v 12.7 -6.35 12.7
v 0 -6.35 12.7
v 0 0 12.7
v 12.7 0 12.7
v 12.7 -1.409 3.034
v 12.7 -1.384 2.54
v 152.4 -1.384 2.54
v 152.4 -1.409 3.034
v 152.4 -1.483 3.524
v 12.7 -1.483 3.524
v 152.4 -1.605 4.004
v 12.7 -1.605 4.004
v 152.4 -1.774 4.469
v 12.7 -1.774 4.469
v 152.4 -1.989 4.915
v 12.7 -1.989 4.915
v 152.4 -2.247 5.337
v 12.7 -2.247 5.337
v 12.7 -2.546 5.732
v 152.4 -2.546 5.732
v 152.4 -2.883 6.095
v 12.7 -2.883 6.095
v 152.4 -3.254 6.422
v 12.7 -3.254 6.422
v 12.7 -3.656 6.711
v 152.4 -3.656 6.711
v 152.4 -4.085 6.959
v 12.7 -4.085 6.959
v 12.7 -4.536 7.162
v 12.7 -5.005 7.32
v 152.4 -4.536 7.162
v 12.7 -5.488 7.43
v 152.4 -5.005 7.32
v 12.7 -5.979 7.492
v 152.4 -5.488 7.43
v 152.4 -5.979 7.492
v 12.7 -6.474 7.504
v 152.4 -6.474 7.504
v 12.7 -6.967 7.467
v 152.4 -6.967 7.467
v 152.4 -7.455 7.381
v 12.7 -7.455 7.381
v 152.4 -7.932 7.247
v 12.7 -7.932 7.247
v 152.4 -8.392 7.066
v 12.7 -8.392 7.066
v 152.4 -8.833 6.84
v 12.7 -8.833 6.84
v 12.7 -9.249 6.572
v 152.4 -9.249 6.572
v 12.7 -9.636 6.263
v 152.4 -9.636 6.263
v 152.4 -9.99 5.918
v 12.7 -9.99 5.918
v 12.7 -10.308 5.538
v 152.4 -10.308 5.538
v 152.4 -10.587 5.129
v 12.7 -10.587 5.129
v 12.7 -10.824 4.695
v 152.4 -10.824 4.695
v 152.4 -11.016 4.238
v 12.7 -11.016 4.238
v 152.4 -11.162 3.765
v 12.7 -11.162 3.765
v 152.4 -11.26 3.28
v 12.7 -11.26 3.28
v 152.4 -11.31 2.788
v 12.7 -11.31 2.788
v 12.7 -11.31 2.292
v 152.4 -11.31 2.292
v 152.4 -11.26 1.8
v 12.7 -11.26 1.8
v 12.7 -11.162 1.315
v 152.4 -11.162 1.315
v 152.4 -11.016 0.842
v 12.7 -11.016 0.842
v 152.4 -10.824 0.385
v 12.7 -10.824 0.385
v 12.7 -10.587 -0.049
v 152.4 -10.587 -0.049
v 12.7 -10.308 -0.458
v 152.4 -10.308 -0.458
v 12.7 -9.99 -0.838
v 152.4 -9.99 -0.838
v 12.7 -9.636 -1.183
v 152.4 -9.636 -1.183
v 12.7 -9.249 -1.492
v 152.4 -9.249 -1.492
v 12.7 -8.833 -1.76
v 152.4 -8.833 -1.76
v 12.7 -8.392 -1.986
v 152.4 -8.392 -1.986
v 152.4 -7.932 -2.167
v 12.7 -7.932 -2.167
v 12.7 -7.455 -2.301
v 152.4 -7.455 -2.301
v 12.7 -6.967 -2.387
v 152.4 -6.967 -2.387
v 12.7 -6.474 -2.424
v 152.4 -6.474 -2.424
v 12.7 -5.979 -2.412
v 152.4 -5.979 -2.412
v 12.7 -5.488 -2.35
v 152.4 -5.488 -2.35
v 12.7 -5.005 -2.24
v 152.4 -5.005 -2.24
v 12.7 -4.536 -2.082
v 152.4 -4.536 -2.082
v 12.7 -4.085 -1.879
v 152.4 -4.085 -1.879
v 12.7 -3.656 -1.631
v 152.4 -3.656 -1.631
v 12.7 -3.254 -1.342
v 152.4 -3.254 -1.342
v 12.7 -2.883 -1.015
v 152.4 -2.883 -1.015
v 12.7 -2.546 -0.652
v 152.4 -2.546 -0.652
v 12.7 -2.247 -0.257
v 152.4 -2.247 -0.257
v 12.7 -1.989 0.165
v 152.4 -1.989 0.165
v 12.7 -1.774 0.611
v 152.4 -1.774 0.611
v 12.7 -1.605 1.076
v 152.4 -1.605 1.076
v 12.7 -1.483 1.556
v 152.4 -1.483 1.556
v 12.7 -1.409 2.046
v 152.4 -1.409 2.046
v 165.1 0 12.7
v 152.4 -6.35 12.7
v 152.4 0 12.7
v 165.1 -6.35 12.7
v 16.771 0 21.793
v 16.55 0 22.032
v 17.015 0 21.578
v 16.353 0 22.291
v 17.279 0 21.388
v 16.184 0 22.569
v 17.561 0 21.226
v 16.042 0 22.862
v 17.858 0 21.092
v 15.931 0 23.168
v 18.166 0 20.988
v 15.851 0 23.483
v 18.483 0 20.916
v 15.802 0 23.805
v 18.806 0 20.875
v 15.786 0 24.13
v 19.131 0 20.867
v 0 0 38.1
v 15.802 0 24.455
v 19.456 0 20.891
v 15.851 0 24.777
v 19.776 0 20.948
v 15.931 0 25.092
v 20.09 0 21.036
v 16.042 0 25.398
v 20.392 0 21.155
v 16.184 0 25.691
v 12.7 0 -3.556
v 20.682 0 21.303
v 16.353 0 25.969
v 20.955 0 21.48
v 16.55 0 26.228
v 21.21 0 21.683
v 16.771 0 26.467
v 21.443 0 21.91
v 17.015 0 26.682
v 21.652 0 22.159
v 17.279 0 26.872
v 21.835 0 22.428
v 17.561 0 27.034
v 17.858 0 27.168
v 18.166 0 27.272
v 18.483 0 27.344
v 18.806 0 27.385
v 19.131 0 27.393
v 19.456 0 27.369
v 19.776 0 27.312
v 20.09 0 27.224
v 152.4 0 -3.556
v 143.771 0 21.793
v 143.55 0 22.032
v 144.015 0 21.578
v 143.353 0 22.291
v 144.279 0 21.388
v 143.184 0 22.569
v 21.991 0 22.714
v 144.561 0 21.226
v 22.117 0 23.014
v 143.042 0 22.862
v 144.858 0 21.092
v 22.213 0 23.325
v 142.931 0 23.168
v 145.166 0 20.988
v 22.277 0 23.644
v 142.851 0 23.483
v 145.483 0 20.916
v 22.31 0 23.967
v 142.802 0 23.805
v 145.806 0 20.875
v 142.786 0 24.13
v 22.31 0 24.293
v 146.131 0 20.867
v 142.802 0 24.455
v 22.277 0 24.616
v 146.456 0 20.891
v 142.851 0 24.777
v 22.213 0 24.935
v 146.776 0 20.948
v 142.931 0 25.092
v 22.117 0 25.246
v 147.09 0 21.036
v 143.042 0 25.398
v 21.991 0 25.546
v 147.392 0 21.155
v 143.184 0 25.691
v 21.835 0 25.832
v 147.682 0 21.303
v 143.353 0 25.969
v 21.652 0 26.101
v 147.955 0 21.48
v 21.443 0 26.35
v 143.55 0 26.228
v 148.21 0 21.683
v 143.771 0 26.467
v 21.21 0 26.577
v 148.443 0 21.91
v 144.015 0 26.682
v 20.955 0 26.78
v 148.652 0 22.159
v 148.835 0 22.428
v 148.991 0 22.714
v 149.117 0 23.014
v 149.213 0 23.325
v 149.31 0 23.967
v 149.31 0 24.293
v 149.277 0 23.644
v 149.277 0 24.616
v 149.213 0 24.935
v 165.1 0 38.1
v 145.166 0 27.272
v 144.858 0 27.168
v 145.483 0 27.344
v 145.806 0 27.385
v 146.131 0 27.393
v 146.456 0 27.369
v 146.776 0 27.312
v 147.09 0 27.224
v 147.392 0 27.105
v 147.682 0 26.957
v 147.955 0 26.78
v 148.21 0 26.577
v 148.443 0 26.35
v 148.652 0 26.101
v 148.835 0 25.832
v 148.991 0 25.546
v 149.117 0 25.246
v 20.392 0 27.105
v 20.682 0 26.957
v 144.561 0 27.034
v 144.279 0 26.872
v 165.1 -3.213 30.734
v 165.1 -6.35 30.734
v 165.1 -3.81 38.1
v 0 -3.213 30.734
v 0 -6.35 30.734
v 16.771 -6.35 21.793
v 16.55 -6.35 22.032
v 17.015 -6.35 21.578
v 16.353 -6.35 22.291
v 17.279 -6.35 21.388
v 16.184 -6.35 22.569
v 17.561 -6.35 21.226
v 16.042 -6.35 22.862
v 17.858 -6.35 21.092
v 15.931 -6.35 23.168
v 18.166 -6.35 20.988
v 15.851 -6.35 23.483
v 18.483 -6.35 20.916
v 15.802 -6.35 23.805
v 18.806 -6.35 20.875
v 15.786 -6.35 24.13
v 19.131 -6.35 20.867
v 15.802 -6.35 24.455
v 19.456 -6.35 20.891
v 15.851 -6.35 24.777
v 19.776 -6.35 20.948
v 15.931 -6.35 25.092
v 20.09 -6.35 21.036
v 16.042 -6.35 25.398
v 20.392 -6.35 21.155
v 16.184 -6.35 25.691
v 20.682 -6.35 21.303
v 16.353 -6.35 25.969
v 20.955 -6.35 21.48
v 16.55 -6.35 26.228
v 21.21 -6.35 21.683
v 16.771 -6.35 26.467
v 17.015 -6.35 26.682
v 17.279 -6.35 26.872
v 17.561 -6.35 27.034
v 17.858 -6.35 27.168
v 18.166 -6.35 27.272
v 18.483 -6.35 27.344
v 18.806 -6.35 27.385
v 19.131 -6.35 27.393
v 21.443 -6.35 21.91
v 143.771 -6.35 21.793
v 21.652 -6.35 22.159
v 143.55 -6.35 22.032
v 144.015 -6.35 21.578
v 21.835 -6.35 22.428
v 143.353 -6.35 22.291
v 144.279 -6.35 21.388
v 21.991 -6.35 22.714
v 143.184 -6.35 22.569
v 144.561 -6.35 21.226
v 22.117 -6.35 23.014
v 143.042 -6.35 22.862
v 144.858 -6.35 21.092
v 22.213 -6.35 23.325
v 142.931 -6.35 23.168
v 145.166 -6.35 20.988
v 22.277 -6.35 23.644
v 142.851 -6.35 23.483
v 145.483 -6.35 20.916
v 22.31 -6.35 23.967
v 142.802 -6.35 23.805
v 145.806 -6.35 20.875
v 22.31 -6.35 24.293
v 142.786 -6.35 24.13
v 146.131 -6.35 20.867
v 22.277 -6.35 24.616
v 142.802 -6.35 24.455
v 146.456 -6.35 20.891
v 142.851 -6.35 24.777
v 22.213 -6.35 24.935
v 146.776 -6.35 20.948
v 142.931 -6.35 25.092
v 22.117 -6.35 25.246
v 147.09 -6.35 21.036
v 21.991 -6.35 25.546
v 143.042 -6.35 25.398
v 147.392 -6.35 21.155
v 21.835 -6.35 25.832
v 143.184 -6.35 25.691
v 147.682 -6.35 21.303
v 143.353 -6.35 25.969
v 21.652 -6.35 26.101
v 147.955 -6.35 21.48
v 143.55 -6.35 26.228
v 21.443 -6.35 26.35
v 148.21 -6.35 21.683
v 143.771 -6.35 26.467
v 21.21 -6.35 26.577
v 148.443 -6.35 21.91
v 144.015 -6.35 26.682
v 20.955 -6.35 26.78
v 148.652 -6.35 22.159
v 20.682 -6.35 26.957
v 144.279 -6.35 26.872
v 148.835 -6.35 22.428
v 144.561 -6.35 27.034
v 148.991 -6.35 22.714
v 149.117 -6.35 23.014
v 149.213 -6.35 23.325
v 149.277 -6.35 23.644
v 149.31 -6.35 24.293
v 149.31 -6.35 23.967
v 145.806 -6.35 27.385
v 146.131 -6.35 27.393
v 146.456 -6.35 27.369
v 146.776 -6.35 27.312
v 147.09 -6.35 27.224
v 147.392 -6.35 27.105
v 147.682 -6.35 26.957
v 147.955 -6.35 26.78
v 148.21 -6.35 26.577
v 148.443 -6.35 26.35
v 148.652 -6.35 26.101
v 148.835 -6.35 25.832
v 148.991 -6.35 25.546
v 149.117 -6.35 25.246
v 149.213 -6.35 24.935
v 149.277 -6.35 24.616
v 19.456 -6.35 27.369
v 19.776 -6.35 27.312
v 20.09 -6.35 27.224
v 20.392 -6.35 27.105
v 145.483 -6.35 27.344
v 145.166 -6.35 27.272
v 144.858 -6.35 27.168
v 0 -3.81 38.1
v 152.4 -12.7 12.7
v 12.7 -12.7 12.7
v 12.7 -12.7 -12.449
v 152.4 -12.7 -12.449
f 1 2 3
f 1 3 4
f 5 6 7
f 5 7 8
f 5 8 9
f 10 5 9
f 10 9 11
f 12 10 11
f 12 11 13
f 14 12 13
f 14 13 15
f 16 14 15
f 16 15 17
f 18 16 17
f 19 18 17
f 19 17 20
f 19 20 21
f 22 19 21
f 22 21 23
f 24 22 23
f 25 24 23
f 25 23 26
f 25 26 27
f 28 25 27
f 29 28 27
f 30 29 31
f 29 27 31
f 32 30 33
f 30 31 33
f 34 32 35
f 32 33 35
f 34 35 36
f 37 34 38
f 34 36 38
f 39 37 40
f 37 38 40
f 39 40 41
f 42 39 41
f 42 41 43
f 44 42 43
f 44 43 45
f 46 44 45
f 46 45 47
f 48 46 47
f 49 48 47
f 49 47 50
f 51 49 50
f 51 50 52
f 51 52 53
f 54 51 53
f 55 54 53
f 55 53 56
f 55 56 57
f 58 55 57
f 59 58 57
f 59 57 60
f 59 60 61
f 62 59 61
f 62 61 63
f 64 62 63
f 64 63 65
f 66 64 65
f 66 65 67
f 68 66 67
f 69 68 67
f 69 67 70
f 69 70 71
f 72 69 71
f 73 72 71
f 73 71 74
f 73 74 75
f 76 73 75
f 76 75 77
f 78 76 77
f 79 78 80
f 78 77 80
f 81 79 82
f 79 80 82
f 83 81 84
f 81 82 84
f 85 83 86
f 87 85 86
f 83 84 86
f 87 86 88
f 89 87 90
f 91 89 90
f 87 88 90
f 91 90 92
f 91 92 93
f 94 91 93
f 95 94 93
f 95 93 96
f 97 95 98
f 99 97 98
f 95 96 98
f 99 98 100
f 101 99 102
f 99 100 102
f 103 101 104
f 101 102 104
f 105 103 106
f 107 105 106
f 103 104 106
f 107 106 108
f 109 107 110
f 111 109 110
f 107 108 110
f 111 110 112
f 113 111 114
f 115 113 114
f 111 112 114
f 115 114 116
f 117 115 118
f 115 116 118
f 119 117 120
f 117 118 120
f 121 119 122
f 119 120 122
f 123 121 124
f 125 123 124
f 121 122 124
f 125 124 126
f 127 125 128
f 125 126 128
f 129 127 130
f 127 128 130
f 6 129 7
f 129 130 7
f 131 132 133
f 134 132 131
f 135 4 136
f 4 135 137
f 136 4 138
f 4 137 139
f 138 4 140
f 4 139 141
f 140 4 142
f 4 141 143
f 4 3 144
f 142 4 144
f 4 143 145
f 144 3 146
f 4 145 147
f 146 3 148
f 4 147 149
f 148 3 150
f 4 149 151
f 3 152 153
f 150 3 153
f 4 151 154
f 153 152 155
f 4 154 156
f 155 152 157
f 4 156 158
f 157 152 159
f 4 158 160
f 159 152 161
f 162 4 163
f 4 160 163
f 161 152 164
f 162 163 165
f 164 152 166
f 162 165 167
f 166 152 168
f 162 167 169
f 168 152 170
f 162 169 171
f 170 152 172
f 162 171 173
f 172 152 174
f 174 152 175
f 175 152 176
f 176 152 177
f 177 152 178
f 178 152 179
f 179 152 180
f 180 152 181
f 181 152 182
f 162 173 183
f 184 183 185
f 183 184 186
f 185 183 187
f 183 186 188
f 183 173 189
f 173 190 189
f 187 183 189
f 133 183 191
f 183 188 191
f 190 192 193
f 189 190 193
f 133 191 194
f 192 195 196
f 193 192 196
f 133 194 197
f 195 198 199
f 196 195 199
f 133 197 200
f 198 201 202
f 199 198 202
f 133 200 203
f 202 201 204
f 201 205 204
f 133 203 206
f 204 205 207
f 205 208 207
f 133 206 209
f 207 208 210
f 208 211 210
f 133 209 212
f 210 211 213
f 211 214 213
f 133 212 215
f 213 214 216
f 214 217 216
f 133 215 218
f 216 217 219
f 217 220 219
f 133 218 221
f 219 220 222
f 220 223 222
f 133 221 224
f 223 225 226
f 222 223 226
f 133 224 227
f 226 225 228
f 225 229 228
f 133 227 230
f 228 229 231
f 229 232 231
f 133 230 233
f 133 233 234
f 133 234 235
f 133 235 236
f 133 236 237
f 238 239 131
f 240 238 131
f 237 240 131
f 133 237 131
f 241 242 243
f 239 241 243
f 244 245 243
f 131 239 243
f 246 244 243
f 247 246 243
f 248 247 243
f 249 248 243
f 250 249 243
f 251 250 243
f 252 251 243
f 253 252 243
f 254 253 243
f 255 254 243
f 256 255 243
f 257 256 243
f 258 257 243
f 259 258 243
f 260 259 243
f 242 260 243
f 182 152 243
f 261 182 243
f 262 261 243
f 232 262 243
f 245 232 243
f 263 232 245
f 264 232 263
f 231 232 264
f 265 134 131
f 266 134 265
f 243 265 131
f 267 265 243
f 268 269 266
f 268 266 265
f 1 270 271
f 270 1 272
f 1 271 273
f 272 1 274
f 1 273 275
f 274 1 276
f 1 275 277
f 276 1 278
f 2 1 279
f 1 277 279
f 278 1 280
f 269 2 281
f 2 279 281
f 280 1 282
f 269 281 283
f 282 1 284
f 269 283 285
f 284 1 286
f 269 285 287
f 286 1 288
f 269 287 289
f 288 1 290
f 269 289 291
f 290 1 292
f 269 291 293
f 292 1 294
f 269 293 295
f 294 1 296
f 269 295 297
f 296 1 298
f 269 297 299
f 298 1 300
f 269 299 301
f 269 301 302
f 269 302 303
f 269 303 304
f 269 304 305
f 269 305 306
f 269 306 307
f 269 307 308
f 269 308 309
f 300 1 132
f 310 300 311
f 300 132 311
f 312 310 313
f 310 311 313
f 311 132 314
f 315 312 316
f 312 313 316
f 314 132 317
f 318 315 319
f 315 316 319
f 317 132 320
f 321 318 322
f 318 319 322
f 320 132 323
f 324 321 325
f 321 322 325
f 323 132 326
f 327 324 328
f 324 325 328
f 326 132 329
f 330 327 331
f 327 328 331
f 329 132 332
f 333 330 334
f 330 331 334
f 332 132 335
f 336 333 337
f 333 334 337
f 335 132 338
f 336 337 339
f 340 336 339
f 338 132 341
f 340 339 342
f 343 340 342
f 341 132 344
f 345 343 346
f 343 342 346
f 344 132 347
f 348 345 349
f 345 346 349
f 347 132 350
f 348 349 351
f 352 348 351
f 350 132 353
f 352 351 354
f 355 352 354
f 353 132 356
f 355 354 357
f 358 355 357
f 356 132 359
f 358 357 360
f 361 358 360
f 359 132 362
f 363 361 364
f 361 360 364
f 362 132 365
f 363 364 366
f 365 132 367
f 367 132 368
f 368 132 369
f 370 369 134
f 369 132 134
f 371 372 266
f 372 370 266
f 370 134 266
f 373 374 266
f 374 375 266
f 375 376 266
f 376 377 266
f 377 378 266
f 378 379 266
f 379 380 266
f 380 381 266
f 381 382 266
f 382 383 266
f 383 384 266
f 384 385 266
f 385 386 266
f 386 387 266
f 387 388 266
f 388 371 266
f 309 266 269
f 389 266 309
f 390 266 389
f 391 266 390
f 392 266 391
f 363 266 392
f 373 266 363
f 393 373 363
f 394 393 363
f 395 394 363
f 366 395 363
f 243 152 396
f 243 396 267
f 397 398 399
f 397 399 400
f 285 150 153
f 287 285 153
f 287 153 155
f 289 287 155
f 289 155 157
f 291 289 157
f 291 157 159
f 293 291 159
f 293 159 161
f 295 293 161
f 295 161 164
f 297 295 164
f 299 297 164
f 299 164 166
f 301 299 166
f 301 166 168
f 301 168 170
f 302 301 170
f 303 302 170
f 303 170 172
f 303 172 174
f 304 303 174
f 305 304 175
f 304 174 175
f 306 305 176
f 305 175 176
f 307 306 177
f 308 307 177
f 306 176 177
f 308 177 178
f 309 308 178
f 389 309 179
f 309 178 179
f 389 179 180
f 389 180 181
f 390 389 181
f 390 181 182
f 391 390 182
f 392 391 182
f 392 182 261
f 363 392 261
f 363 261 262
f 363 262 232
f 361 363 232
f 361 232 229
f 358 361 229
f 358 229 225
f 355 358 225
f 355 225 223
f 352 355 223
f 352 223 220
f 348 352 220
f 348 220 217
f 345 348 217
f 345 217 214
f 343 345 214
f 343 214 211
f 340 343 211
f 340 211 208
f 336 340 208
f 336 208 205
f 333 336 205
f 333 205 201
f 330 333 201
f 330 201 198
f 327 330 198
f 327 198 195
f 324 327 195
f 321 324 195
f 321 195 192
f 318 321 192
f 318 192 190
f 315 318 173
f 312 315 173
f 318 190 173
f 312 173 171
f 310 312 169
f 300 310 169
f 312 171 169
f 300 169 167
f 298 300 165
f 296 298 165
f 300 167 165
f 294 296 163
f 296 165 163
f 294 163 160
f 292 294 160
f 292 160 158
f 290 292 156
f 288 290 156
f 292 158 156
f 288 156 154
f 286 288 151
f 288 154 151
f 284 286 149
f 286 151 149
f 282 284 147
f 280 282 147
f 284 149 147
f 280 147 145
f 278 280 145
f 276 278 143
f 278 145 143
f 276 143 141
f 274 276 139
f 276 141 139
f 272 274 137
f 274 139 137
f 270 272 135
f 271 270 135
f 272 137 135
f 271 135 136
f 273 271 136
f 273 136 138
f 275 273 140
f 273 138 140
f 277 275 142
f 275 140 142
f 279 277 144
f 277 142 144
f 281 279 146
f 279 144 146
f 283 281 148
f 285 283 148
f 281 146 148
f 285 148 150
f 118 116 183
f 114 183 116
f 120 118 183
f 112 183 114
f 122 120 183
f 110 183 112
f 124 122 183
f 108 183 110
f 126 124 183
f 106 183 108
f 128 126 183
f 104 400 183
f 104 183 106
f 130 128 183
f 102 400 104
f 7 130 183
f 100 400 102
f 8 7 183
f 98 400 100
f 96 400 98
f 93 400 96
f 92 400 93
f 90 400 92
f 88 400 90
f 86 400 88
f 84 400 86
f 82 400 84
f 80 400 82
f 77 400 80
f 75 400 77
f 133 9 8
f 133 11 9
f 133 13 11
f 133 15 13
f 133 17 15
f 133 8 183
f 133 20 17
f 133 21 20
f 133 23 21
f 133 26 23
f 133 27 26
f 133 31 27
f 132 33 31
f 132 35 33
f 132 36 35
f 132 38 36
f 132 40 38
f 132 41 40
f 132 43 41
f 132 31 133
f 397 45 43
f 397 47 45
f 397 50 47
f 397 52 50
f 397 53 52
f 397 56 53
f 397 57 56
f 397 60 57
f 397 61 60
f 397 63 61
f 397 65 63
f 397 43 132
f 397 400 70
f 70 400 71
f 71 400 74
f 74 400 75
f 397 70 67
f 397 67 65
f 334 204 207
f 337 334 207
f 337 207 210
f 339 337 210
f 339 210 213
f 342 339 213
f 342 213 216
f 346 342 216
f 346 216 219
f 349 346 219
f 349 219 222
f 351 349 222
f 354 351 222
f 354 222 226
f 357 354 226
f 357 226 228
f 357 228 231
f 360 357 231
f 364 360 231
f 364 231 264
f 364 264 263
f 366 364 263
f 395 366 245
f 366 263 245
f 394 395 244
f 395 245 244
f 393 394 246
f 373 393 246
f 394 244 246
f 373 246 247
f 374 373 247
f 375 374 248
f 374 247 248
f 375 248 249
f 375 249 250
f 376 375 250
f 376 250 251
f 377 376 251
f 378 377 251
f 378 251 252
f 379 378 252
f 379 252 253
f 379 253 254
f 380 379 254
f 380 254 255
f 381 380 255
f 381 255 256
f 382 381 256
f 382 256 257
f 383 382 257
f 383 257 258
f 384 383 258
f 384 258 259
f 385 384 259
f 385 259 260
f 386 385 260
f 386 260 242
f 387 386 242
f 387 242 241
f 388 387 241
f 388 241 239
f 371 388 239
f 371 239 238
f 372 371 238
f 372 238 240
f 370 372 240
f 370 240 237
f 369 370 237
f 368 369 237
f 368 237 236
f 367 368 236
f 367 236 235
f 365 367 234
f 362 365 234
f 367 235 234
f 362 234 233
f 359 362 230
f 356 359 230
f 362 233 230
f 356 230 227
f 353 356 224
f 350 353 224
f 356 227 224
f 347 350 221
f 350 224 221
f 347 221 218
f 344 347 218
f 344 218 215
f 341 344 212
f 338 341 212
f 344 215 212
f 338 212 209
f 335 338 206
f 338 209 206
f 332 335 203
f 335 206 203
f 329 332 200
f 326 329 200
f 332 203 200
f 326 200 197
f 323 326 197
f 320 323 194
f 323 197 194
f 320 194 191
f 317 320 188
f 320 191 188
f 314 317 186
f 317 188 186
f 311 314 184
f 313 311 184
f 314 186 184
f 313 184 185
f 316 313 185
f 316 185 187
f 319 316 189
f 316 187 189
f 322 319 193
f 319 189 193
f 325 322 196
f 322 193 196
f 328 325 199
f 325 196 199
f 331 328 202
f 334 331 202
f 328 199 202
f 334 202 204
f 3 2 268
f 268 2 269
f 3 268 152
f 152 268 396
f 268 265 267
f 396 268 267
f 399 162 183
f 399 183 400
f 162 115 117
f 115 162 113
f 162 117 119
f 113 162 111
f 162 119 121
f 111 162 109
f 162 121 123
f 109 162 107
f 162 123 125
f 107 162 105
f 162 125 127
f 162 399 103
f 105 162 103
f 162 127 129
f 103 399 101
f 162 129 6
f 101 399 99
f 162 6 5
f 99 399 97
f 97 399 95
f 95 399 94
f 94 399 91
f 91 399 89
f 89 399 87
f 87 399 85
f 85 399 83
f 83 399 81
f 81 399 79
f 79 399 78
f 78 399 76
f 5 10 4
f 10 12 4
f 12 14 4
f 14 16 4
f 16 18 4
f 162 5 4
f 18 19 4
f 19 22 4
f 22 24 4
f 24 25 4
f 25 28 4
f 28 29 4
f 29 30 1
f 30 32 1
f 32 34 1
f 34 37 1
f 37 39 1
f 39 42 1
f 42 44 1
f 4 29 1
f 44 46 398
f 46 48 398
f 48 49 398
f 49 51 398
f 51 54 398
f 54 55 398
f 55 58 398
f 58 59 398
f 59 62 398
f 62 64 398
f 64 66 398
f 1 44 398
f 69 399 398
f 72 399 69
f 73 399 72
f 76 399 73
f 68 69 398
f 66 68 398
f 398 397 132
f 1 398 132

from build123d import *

# Parameters (mm, degrees)
F0_W         = 165.1
F0_H         = 38.1
F1_DEPTH     = 12.7
F3_DEPTH     = 165.101
F4_W         = 165.1
F4_H         = 12.7
F5_DEPTH     = 12.7
F7_D         = 6.5278
F9_W         = 12.7
F9_H         = 25.4
F10_DEPTH    = 12.701
F11_D        = 9.9314
F12_T1_DEPTH = 207.1510236039


# Not quite as in the source:
# - a fillet or chamfer that OpenCascade refuses, or shapes differently, is made with other operations: its cross-section is extruded or revolved along the edge and cut away or added


with BuildPart() as f1:
    # F0 (on Front) → F1 (new body)
    with BuildSketch(Plane.XZ):
        with Locations((82.55, 19.05)):
            Rectangle(F0_W, F0_H)
    extrude(amount=F1_DEPTH)

    # F2 (on face) → F3 (cut, through all)
    with BuildSketch(Plane.YZ.offset(165.1)):
        Polygon((-6.35, 12.7), (-6.35, 30.734), (-3.2131, 30.734), (-3.81, 38.1), (-8.89, 38.1), (-12.7, 38.1), (-12.7, 27.7622), (-12.7, 12.7), align=None)
    extrude(amount=-F3_DEPTH, mode=Mode.SUBTRACT)

    # F4 (on face) → F5 (join)
    with BuildSketch(Plane.XZ.offset(12.7)):
        with Locations((82.55, -6.35)):
            Rectangle(F4_W, F4_H)
    extrude(amount=-F5_DEPTH)

    # F7 (through all)
    with Locations(Plane.XZ.offset(6.35)):
        with Locations((19.05, 24.13), (146.05, 24.13)):
            Hole(F7_D / 2)

    # F9 (on face) → F10 (cut, through all)
    with BuildSketch(Plane.XZ.offset(12.7)):
        with Locations((6.35, 0)):
            Rectangle(F9_W, F9_H)
        with Locations((158.75, 0)):
            Rectangle(F9_W, F9_H)
    extrude(amount=-F10_DEPTH, mode=Mode.SUBTRACT)

    # F11 (through all)
    with Locations(Plane(origin=(0, 0, 0), x_dir=(0, -1, 0), z_dir=(-1, 0, 0))):
        with Locations((6.35, 2.54)):
            Hole(F11_D / 2)

    # F12: chamfer of 9.144 x 13.0589853736 on 1 edges, made by hand

    # F12_s2 → F12_t1 (cut)
    with BuildSketch(Plane.YZ.offset(-21.025511802)):
        Polygon((0, -3.556), (-13.0589853736, -12.7), (0, -12.7), align=None)
    extrude(amount=F12_T1_DEPTH, mode=Mode.SUBTRACT)


solid = f1.part
